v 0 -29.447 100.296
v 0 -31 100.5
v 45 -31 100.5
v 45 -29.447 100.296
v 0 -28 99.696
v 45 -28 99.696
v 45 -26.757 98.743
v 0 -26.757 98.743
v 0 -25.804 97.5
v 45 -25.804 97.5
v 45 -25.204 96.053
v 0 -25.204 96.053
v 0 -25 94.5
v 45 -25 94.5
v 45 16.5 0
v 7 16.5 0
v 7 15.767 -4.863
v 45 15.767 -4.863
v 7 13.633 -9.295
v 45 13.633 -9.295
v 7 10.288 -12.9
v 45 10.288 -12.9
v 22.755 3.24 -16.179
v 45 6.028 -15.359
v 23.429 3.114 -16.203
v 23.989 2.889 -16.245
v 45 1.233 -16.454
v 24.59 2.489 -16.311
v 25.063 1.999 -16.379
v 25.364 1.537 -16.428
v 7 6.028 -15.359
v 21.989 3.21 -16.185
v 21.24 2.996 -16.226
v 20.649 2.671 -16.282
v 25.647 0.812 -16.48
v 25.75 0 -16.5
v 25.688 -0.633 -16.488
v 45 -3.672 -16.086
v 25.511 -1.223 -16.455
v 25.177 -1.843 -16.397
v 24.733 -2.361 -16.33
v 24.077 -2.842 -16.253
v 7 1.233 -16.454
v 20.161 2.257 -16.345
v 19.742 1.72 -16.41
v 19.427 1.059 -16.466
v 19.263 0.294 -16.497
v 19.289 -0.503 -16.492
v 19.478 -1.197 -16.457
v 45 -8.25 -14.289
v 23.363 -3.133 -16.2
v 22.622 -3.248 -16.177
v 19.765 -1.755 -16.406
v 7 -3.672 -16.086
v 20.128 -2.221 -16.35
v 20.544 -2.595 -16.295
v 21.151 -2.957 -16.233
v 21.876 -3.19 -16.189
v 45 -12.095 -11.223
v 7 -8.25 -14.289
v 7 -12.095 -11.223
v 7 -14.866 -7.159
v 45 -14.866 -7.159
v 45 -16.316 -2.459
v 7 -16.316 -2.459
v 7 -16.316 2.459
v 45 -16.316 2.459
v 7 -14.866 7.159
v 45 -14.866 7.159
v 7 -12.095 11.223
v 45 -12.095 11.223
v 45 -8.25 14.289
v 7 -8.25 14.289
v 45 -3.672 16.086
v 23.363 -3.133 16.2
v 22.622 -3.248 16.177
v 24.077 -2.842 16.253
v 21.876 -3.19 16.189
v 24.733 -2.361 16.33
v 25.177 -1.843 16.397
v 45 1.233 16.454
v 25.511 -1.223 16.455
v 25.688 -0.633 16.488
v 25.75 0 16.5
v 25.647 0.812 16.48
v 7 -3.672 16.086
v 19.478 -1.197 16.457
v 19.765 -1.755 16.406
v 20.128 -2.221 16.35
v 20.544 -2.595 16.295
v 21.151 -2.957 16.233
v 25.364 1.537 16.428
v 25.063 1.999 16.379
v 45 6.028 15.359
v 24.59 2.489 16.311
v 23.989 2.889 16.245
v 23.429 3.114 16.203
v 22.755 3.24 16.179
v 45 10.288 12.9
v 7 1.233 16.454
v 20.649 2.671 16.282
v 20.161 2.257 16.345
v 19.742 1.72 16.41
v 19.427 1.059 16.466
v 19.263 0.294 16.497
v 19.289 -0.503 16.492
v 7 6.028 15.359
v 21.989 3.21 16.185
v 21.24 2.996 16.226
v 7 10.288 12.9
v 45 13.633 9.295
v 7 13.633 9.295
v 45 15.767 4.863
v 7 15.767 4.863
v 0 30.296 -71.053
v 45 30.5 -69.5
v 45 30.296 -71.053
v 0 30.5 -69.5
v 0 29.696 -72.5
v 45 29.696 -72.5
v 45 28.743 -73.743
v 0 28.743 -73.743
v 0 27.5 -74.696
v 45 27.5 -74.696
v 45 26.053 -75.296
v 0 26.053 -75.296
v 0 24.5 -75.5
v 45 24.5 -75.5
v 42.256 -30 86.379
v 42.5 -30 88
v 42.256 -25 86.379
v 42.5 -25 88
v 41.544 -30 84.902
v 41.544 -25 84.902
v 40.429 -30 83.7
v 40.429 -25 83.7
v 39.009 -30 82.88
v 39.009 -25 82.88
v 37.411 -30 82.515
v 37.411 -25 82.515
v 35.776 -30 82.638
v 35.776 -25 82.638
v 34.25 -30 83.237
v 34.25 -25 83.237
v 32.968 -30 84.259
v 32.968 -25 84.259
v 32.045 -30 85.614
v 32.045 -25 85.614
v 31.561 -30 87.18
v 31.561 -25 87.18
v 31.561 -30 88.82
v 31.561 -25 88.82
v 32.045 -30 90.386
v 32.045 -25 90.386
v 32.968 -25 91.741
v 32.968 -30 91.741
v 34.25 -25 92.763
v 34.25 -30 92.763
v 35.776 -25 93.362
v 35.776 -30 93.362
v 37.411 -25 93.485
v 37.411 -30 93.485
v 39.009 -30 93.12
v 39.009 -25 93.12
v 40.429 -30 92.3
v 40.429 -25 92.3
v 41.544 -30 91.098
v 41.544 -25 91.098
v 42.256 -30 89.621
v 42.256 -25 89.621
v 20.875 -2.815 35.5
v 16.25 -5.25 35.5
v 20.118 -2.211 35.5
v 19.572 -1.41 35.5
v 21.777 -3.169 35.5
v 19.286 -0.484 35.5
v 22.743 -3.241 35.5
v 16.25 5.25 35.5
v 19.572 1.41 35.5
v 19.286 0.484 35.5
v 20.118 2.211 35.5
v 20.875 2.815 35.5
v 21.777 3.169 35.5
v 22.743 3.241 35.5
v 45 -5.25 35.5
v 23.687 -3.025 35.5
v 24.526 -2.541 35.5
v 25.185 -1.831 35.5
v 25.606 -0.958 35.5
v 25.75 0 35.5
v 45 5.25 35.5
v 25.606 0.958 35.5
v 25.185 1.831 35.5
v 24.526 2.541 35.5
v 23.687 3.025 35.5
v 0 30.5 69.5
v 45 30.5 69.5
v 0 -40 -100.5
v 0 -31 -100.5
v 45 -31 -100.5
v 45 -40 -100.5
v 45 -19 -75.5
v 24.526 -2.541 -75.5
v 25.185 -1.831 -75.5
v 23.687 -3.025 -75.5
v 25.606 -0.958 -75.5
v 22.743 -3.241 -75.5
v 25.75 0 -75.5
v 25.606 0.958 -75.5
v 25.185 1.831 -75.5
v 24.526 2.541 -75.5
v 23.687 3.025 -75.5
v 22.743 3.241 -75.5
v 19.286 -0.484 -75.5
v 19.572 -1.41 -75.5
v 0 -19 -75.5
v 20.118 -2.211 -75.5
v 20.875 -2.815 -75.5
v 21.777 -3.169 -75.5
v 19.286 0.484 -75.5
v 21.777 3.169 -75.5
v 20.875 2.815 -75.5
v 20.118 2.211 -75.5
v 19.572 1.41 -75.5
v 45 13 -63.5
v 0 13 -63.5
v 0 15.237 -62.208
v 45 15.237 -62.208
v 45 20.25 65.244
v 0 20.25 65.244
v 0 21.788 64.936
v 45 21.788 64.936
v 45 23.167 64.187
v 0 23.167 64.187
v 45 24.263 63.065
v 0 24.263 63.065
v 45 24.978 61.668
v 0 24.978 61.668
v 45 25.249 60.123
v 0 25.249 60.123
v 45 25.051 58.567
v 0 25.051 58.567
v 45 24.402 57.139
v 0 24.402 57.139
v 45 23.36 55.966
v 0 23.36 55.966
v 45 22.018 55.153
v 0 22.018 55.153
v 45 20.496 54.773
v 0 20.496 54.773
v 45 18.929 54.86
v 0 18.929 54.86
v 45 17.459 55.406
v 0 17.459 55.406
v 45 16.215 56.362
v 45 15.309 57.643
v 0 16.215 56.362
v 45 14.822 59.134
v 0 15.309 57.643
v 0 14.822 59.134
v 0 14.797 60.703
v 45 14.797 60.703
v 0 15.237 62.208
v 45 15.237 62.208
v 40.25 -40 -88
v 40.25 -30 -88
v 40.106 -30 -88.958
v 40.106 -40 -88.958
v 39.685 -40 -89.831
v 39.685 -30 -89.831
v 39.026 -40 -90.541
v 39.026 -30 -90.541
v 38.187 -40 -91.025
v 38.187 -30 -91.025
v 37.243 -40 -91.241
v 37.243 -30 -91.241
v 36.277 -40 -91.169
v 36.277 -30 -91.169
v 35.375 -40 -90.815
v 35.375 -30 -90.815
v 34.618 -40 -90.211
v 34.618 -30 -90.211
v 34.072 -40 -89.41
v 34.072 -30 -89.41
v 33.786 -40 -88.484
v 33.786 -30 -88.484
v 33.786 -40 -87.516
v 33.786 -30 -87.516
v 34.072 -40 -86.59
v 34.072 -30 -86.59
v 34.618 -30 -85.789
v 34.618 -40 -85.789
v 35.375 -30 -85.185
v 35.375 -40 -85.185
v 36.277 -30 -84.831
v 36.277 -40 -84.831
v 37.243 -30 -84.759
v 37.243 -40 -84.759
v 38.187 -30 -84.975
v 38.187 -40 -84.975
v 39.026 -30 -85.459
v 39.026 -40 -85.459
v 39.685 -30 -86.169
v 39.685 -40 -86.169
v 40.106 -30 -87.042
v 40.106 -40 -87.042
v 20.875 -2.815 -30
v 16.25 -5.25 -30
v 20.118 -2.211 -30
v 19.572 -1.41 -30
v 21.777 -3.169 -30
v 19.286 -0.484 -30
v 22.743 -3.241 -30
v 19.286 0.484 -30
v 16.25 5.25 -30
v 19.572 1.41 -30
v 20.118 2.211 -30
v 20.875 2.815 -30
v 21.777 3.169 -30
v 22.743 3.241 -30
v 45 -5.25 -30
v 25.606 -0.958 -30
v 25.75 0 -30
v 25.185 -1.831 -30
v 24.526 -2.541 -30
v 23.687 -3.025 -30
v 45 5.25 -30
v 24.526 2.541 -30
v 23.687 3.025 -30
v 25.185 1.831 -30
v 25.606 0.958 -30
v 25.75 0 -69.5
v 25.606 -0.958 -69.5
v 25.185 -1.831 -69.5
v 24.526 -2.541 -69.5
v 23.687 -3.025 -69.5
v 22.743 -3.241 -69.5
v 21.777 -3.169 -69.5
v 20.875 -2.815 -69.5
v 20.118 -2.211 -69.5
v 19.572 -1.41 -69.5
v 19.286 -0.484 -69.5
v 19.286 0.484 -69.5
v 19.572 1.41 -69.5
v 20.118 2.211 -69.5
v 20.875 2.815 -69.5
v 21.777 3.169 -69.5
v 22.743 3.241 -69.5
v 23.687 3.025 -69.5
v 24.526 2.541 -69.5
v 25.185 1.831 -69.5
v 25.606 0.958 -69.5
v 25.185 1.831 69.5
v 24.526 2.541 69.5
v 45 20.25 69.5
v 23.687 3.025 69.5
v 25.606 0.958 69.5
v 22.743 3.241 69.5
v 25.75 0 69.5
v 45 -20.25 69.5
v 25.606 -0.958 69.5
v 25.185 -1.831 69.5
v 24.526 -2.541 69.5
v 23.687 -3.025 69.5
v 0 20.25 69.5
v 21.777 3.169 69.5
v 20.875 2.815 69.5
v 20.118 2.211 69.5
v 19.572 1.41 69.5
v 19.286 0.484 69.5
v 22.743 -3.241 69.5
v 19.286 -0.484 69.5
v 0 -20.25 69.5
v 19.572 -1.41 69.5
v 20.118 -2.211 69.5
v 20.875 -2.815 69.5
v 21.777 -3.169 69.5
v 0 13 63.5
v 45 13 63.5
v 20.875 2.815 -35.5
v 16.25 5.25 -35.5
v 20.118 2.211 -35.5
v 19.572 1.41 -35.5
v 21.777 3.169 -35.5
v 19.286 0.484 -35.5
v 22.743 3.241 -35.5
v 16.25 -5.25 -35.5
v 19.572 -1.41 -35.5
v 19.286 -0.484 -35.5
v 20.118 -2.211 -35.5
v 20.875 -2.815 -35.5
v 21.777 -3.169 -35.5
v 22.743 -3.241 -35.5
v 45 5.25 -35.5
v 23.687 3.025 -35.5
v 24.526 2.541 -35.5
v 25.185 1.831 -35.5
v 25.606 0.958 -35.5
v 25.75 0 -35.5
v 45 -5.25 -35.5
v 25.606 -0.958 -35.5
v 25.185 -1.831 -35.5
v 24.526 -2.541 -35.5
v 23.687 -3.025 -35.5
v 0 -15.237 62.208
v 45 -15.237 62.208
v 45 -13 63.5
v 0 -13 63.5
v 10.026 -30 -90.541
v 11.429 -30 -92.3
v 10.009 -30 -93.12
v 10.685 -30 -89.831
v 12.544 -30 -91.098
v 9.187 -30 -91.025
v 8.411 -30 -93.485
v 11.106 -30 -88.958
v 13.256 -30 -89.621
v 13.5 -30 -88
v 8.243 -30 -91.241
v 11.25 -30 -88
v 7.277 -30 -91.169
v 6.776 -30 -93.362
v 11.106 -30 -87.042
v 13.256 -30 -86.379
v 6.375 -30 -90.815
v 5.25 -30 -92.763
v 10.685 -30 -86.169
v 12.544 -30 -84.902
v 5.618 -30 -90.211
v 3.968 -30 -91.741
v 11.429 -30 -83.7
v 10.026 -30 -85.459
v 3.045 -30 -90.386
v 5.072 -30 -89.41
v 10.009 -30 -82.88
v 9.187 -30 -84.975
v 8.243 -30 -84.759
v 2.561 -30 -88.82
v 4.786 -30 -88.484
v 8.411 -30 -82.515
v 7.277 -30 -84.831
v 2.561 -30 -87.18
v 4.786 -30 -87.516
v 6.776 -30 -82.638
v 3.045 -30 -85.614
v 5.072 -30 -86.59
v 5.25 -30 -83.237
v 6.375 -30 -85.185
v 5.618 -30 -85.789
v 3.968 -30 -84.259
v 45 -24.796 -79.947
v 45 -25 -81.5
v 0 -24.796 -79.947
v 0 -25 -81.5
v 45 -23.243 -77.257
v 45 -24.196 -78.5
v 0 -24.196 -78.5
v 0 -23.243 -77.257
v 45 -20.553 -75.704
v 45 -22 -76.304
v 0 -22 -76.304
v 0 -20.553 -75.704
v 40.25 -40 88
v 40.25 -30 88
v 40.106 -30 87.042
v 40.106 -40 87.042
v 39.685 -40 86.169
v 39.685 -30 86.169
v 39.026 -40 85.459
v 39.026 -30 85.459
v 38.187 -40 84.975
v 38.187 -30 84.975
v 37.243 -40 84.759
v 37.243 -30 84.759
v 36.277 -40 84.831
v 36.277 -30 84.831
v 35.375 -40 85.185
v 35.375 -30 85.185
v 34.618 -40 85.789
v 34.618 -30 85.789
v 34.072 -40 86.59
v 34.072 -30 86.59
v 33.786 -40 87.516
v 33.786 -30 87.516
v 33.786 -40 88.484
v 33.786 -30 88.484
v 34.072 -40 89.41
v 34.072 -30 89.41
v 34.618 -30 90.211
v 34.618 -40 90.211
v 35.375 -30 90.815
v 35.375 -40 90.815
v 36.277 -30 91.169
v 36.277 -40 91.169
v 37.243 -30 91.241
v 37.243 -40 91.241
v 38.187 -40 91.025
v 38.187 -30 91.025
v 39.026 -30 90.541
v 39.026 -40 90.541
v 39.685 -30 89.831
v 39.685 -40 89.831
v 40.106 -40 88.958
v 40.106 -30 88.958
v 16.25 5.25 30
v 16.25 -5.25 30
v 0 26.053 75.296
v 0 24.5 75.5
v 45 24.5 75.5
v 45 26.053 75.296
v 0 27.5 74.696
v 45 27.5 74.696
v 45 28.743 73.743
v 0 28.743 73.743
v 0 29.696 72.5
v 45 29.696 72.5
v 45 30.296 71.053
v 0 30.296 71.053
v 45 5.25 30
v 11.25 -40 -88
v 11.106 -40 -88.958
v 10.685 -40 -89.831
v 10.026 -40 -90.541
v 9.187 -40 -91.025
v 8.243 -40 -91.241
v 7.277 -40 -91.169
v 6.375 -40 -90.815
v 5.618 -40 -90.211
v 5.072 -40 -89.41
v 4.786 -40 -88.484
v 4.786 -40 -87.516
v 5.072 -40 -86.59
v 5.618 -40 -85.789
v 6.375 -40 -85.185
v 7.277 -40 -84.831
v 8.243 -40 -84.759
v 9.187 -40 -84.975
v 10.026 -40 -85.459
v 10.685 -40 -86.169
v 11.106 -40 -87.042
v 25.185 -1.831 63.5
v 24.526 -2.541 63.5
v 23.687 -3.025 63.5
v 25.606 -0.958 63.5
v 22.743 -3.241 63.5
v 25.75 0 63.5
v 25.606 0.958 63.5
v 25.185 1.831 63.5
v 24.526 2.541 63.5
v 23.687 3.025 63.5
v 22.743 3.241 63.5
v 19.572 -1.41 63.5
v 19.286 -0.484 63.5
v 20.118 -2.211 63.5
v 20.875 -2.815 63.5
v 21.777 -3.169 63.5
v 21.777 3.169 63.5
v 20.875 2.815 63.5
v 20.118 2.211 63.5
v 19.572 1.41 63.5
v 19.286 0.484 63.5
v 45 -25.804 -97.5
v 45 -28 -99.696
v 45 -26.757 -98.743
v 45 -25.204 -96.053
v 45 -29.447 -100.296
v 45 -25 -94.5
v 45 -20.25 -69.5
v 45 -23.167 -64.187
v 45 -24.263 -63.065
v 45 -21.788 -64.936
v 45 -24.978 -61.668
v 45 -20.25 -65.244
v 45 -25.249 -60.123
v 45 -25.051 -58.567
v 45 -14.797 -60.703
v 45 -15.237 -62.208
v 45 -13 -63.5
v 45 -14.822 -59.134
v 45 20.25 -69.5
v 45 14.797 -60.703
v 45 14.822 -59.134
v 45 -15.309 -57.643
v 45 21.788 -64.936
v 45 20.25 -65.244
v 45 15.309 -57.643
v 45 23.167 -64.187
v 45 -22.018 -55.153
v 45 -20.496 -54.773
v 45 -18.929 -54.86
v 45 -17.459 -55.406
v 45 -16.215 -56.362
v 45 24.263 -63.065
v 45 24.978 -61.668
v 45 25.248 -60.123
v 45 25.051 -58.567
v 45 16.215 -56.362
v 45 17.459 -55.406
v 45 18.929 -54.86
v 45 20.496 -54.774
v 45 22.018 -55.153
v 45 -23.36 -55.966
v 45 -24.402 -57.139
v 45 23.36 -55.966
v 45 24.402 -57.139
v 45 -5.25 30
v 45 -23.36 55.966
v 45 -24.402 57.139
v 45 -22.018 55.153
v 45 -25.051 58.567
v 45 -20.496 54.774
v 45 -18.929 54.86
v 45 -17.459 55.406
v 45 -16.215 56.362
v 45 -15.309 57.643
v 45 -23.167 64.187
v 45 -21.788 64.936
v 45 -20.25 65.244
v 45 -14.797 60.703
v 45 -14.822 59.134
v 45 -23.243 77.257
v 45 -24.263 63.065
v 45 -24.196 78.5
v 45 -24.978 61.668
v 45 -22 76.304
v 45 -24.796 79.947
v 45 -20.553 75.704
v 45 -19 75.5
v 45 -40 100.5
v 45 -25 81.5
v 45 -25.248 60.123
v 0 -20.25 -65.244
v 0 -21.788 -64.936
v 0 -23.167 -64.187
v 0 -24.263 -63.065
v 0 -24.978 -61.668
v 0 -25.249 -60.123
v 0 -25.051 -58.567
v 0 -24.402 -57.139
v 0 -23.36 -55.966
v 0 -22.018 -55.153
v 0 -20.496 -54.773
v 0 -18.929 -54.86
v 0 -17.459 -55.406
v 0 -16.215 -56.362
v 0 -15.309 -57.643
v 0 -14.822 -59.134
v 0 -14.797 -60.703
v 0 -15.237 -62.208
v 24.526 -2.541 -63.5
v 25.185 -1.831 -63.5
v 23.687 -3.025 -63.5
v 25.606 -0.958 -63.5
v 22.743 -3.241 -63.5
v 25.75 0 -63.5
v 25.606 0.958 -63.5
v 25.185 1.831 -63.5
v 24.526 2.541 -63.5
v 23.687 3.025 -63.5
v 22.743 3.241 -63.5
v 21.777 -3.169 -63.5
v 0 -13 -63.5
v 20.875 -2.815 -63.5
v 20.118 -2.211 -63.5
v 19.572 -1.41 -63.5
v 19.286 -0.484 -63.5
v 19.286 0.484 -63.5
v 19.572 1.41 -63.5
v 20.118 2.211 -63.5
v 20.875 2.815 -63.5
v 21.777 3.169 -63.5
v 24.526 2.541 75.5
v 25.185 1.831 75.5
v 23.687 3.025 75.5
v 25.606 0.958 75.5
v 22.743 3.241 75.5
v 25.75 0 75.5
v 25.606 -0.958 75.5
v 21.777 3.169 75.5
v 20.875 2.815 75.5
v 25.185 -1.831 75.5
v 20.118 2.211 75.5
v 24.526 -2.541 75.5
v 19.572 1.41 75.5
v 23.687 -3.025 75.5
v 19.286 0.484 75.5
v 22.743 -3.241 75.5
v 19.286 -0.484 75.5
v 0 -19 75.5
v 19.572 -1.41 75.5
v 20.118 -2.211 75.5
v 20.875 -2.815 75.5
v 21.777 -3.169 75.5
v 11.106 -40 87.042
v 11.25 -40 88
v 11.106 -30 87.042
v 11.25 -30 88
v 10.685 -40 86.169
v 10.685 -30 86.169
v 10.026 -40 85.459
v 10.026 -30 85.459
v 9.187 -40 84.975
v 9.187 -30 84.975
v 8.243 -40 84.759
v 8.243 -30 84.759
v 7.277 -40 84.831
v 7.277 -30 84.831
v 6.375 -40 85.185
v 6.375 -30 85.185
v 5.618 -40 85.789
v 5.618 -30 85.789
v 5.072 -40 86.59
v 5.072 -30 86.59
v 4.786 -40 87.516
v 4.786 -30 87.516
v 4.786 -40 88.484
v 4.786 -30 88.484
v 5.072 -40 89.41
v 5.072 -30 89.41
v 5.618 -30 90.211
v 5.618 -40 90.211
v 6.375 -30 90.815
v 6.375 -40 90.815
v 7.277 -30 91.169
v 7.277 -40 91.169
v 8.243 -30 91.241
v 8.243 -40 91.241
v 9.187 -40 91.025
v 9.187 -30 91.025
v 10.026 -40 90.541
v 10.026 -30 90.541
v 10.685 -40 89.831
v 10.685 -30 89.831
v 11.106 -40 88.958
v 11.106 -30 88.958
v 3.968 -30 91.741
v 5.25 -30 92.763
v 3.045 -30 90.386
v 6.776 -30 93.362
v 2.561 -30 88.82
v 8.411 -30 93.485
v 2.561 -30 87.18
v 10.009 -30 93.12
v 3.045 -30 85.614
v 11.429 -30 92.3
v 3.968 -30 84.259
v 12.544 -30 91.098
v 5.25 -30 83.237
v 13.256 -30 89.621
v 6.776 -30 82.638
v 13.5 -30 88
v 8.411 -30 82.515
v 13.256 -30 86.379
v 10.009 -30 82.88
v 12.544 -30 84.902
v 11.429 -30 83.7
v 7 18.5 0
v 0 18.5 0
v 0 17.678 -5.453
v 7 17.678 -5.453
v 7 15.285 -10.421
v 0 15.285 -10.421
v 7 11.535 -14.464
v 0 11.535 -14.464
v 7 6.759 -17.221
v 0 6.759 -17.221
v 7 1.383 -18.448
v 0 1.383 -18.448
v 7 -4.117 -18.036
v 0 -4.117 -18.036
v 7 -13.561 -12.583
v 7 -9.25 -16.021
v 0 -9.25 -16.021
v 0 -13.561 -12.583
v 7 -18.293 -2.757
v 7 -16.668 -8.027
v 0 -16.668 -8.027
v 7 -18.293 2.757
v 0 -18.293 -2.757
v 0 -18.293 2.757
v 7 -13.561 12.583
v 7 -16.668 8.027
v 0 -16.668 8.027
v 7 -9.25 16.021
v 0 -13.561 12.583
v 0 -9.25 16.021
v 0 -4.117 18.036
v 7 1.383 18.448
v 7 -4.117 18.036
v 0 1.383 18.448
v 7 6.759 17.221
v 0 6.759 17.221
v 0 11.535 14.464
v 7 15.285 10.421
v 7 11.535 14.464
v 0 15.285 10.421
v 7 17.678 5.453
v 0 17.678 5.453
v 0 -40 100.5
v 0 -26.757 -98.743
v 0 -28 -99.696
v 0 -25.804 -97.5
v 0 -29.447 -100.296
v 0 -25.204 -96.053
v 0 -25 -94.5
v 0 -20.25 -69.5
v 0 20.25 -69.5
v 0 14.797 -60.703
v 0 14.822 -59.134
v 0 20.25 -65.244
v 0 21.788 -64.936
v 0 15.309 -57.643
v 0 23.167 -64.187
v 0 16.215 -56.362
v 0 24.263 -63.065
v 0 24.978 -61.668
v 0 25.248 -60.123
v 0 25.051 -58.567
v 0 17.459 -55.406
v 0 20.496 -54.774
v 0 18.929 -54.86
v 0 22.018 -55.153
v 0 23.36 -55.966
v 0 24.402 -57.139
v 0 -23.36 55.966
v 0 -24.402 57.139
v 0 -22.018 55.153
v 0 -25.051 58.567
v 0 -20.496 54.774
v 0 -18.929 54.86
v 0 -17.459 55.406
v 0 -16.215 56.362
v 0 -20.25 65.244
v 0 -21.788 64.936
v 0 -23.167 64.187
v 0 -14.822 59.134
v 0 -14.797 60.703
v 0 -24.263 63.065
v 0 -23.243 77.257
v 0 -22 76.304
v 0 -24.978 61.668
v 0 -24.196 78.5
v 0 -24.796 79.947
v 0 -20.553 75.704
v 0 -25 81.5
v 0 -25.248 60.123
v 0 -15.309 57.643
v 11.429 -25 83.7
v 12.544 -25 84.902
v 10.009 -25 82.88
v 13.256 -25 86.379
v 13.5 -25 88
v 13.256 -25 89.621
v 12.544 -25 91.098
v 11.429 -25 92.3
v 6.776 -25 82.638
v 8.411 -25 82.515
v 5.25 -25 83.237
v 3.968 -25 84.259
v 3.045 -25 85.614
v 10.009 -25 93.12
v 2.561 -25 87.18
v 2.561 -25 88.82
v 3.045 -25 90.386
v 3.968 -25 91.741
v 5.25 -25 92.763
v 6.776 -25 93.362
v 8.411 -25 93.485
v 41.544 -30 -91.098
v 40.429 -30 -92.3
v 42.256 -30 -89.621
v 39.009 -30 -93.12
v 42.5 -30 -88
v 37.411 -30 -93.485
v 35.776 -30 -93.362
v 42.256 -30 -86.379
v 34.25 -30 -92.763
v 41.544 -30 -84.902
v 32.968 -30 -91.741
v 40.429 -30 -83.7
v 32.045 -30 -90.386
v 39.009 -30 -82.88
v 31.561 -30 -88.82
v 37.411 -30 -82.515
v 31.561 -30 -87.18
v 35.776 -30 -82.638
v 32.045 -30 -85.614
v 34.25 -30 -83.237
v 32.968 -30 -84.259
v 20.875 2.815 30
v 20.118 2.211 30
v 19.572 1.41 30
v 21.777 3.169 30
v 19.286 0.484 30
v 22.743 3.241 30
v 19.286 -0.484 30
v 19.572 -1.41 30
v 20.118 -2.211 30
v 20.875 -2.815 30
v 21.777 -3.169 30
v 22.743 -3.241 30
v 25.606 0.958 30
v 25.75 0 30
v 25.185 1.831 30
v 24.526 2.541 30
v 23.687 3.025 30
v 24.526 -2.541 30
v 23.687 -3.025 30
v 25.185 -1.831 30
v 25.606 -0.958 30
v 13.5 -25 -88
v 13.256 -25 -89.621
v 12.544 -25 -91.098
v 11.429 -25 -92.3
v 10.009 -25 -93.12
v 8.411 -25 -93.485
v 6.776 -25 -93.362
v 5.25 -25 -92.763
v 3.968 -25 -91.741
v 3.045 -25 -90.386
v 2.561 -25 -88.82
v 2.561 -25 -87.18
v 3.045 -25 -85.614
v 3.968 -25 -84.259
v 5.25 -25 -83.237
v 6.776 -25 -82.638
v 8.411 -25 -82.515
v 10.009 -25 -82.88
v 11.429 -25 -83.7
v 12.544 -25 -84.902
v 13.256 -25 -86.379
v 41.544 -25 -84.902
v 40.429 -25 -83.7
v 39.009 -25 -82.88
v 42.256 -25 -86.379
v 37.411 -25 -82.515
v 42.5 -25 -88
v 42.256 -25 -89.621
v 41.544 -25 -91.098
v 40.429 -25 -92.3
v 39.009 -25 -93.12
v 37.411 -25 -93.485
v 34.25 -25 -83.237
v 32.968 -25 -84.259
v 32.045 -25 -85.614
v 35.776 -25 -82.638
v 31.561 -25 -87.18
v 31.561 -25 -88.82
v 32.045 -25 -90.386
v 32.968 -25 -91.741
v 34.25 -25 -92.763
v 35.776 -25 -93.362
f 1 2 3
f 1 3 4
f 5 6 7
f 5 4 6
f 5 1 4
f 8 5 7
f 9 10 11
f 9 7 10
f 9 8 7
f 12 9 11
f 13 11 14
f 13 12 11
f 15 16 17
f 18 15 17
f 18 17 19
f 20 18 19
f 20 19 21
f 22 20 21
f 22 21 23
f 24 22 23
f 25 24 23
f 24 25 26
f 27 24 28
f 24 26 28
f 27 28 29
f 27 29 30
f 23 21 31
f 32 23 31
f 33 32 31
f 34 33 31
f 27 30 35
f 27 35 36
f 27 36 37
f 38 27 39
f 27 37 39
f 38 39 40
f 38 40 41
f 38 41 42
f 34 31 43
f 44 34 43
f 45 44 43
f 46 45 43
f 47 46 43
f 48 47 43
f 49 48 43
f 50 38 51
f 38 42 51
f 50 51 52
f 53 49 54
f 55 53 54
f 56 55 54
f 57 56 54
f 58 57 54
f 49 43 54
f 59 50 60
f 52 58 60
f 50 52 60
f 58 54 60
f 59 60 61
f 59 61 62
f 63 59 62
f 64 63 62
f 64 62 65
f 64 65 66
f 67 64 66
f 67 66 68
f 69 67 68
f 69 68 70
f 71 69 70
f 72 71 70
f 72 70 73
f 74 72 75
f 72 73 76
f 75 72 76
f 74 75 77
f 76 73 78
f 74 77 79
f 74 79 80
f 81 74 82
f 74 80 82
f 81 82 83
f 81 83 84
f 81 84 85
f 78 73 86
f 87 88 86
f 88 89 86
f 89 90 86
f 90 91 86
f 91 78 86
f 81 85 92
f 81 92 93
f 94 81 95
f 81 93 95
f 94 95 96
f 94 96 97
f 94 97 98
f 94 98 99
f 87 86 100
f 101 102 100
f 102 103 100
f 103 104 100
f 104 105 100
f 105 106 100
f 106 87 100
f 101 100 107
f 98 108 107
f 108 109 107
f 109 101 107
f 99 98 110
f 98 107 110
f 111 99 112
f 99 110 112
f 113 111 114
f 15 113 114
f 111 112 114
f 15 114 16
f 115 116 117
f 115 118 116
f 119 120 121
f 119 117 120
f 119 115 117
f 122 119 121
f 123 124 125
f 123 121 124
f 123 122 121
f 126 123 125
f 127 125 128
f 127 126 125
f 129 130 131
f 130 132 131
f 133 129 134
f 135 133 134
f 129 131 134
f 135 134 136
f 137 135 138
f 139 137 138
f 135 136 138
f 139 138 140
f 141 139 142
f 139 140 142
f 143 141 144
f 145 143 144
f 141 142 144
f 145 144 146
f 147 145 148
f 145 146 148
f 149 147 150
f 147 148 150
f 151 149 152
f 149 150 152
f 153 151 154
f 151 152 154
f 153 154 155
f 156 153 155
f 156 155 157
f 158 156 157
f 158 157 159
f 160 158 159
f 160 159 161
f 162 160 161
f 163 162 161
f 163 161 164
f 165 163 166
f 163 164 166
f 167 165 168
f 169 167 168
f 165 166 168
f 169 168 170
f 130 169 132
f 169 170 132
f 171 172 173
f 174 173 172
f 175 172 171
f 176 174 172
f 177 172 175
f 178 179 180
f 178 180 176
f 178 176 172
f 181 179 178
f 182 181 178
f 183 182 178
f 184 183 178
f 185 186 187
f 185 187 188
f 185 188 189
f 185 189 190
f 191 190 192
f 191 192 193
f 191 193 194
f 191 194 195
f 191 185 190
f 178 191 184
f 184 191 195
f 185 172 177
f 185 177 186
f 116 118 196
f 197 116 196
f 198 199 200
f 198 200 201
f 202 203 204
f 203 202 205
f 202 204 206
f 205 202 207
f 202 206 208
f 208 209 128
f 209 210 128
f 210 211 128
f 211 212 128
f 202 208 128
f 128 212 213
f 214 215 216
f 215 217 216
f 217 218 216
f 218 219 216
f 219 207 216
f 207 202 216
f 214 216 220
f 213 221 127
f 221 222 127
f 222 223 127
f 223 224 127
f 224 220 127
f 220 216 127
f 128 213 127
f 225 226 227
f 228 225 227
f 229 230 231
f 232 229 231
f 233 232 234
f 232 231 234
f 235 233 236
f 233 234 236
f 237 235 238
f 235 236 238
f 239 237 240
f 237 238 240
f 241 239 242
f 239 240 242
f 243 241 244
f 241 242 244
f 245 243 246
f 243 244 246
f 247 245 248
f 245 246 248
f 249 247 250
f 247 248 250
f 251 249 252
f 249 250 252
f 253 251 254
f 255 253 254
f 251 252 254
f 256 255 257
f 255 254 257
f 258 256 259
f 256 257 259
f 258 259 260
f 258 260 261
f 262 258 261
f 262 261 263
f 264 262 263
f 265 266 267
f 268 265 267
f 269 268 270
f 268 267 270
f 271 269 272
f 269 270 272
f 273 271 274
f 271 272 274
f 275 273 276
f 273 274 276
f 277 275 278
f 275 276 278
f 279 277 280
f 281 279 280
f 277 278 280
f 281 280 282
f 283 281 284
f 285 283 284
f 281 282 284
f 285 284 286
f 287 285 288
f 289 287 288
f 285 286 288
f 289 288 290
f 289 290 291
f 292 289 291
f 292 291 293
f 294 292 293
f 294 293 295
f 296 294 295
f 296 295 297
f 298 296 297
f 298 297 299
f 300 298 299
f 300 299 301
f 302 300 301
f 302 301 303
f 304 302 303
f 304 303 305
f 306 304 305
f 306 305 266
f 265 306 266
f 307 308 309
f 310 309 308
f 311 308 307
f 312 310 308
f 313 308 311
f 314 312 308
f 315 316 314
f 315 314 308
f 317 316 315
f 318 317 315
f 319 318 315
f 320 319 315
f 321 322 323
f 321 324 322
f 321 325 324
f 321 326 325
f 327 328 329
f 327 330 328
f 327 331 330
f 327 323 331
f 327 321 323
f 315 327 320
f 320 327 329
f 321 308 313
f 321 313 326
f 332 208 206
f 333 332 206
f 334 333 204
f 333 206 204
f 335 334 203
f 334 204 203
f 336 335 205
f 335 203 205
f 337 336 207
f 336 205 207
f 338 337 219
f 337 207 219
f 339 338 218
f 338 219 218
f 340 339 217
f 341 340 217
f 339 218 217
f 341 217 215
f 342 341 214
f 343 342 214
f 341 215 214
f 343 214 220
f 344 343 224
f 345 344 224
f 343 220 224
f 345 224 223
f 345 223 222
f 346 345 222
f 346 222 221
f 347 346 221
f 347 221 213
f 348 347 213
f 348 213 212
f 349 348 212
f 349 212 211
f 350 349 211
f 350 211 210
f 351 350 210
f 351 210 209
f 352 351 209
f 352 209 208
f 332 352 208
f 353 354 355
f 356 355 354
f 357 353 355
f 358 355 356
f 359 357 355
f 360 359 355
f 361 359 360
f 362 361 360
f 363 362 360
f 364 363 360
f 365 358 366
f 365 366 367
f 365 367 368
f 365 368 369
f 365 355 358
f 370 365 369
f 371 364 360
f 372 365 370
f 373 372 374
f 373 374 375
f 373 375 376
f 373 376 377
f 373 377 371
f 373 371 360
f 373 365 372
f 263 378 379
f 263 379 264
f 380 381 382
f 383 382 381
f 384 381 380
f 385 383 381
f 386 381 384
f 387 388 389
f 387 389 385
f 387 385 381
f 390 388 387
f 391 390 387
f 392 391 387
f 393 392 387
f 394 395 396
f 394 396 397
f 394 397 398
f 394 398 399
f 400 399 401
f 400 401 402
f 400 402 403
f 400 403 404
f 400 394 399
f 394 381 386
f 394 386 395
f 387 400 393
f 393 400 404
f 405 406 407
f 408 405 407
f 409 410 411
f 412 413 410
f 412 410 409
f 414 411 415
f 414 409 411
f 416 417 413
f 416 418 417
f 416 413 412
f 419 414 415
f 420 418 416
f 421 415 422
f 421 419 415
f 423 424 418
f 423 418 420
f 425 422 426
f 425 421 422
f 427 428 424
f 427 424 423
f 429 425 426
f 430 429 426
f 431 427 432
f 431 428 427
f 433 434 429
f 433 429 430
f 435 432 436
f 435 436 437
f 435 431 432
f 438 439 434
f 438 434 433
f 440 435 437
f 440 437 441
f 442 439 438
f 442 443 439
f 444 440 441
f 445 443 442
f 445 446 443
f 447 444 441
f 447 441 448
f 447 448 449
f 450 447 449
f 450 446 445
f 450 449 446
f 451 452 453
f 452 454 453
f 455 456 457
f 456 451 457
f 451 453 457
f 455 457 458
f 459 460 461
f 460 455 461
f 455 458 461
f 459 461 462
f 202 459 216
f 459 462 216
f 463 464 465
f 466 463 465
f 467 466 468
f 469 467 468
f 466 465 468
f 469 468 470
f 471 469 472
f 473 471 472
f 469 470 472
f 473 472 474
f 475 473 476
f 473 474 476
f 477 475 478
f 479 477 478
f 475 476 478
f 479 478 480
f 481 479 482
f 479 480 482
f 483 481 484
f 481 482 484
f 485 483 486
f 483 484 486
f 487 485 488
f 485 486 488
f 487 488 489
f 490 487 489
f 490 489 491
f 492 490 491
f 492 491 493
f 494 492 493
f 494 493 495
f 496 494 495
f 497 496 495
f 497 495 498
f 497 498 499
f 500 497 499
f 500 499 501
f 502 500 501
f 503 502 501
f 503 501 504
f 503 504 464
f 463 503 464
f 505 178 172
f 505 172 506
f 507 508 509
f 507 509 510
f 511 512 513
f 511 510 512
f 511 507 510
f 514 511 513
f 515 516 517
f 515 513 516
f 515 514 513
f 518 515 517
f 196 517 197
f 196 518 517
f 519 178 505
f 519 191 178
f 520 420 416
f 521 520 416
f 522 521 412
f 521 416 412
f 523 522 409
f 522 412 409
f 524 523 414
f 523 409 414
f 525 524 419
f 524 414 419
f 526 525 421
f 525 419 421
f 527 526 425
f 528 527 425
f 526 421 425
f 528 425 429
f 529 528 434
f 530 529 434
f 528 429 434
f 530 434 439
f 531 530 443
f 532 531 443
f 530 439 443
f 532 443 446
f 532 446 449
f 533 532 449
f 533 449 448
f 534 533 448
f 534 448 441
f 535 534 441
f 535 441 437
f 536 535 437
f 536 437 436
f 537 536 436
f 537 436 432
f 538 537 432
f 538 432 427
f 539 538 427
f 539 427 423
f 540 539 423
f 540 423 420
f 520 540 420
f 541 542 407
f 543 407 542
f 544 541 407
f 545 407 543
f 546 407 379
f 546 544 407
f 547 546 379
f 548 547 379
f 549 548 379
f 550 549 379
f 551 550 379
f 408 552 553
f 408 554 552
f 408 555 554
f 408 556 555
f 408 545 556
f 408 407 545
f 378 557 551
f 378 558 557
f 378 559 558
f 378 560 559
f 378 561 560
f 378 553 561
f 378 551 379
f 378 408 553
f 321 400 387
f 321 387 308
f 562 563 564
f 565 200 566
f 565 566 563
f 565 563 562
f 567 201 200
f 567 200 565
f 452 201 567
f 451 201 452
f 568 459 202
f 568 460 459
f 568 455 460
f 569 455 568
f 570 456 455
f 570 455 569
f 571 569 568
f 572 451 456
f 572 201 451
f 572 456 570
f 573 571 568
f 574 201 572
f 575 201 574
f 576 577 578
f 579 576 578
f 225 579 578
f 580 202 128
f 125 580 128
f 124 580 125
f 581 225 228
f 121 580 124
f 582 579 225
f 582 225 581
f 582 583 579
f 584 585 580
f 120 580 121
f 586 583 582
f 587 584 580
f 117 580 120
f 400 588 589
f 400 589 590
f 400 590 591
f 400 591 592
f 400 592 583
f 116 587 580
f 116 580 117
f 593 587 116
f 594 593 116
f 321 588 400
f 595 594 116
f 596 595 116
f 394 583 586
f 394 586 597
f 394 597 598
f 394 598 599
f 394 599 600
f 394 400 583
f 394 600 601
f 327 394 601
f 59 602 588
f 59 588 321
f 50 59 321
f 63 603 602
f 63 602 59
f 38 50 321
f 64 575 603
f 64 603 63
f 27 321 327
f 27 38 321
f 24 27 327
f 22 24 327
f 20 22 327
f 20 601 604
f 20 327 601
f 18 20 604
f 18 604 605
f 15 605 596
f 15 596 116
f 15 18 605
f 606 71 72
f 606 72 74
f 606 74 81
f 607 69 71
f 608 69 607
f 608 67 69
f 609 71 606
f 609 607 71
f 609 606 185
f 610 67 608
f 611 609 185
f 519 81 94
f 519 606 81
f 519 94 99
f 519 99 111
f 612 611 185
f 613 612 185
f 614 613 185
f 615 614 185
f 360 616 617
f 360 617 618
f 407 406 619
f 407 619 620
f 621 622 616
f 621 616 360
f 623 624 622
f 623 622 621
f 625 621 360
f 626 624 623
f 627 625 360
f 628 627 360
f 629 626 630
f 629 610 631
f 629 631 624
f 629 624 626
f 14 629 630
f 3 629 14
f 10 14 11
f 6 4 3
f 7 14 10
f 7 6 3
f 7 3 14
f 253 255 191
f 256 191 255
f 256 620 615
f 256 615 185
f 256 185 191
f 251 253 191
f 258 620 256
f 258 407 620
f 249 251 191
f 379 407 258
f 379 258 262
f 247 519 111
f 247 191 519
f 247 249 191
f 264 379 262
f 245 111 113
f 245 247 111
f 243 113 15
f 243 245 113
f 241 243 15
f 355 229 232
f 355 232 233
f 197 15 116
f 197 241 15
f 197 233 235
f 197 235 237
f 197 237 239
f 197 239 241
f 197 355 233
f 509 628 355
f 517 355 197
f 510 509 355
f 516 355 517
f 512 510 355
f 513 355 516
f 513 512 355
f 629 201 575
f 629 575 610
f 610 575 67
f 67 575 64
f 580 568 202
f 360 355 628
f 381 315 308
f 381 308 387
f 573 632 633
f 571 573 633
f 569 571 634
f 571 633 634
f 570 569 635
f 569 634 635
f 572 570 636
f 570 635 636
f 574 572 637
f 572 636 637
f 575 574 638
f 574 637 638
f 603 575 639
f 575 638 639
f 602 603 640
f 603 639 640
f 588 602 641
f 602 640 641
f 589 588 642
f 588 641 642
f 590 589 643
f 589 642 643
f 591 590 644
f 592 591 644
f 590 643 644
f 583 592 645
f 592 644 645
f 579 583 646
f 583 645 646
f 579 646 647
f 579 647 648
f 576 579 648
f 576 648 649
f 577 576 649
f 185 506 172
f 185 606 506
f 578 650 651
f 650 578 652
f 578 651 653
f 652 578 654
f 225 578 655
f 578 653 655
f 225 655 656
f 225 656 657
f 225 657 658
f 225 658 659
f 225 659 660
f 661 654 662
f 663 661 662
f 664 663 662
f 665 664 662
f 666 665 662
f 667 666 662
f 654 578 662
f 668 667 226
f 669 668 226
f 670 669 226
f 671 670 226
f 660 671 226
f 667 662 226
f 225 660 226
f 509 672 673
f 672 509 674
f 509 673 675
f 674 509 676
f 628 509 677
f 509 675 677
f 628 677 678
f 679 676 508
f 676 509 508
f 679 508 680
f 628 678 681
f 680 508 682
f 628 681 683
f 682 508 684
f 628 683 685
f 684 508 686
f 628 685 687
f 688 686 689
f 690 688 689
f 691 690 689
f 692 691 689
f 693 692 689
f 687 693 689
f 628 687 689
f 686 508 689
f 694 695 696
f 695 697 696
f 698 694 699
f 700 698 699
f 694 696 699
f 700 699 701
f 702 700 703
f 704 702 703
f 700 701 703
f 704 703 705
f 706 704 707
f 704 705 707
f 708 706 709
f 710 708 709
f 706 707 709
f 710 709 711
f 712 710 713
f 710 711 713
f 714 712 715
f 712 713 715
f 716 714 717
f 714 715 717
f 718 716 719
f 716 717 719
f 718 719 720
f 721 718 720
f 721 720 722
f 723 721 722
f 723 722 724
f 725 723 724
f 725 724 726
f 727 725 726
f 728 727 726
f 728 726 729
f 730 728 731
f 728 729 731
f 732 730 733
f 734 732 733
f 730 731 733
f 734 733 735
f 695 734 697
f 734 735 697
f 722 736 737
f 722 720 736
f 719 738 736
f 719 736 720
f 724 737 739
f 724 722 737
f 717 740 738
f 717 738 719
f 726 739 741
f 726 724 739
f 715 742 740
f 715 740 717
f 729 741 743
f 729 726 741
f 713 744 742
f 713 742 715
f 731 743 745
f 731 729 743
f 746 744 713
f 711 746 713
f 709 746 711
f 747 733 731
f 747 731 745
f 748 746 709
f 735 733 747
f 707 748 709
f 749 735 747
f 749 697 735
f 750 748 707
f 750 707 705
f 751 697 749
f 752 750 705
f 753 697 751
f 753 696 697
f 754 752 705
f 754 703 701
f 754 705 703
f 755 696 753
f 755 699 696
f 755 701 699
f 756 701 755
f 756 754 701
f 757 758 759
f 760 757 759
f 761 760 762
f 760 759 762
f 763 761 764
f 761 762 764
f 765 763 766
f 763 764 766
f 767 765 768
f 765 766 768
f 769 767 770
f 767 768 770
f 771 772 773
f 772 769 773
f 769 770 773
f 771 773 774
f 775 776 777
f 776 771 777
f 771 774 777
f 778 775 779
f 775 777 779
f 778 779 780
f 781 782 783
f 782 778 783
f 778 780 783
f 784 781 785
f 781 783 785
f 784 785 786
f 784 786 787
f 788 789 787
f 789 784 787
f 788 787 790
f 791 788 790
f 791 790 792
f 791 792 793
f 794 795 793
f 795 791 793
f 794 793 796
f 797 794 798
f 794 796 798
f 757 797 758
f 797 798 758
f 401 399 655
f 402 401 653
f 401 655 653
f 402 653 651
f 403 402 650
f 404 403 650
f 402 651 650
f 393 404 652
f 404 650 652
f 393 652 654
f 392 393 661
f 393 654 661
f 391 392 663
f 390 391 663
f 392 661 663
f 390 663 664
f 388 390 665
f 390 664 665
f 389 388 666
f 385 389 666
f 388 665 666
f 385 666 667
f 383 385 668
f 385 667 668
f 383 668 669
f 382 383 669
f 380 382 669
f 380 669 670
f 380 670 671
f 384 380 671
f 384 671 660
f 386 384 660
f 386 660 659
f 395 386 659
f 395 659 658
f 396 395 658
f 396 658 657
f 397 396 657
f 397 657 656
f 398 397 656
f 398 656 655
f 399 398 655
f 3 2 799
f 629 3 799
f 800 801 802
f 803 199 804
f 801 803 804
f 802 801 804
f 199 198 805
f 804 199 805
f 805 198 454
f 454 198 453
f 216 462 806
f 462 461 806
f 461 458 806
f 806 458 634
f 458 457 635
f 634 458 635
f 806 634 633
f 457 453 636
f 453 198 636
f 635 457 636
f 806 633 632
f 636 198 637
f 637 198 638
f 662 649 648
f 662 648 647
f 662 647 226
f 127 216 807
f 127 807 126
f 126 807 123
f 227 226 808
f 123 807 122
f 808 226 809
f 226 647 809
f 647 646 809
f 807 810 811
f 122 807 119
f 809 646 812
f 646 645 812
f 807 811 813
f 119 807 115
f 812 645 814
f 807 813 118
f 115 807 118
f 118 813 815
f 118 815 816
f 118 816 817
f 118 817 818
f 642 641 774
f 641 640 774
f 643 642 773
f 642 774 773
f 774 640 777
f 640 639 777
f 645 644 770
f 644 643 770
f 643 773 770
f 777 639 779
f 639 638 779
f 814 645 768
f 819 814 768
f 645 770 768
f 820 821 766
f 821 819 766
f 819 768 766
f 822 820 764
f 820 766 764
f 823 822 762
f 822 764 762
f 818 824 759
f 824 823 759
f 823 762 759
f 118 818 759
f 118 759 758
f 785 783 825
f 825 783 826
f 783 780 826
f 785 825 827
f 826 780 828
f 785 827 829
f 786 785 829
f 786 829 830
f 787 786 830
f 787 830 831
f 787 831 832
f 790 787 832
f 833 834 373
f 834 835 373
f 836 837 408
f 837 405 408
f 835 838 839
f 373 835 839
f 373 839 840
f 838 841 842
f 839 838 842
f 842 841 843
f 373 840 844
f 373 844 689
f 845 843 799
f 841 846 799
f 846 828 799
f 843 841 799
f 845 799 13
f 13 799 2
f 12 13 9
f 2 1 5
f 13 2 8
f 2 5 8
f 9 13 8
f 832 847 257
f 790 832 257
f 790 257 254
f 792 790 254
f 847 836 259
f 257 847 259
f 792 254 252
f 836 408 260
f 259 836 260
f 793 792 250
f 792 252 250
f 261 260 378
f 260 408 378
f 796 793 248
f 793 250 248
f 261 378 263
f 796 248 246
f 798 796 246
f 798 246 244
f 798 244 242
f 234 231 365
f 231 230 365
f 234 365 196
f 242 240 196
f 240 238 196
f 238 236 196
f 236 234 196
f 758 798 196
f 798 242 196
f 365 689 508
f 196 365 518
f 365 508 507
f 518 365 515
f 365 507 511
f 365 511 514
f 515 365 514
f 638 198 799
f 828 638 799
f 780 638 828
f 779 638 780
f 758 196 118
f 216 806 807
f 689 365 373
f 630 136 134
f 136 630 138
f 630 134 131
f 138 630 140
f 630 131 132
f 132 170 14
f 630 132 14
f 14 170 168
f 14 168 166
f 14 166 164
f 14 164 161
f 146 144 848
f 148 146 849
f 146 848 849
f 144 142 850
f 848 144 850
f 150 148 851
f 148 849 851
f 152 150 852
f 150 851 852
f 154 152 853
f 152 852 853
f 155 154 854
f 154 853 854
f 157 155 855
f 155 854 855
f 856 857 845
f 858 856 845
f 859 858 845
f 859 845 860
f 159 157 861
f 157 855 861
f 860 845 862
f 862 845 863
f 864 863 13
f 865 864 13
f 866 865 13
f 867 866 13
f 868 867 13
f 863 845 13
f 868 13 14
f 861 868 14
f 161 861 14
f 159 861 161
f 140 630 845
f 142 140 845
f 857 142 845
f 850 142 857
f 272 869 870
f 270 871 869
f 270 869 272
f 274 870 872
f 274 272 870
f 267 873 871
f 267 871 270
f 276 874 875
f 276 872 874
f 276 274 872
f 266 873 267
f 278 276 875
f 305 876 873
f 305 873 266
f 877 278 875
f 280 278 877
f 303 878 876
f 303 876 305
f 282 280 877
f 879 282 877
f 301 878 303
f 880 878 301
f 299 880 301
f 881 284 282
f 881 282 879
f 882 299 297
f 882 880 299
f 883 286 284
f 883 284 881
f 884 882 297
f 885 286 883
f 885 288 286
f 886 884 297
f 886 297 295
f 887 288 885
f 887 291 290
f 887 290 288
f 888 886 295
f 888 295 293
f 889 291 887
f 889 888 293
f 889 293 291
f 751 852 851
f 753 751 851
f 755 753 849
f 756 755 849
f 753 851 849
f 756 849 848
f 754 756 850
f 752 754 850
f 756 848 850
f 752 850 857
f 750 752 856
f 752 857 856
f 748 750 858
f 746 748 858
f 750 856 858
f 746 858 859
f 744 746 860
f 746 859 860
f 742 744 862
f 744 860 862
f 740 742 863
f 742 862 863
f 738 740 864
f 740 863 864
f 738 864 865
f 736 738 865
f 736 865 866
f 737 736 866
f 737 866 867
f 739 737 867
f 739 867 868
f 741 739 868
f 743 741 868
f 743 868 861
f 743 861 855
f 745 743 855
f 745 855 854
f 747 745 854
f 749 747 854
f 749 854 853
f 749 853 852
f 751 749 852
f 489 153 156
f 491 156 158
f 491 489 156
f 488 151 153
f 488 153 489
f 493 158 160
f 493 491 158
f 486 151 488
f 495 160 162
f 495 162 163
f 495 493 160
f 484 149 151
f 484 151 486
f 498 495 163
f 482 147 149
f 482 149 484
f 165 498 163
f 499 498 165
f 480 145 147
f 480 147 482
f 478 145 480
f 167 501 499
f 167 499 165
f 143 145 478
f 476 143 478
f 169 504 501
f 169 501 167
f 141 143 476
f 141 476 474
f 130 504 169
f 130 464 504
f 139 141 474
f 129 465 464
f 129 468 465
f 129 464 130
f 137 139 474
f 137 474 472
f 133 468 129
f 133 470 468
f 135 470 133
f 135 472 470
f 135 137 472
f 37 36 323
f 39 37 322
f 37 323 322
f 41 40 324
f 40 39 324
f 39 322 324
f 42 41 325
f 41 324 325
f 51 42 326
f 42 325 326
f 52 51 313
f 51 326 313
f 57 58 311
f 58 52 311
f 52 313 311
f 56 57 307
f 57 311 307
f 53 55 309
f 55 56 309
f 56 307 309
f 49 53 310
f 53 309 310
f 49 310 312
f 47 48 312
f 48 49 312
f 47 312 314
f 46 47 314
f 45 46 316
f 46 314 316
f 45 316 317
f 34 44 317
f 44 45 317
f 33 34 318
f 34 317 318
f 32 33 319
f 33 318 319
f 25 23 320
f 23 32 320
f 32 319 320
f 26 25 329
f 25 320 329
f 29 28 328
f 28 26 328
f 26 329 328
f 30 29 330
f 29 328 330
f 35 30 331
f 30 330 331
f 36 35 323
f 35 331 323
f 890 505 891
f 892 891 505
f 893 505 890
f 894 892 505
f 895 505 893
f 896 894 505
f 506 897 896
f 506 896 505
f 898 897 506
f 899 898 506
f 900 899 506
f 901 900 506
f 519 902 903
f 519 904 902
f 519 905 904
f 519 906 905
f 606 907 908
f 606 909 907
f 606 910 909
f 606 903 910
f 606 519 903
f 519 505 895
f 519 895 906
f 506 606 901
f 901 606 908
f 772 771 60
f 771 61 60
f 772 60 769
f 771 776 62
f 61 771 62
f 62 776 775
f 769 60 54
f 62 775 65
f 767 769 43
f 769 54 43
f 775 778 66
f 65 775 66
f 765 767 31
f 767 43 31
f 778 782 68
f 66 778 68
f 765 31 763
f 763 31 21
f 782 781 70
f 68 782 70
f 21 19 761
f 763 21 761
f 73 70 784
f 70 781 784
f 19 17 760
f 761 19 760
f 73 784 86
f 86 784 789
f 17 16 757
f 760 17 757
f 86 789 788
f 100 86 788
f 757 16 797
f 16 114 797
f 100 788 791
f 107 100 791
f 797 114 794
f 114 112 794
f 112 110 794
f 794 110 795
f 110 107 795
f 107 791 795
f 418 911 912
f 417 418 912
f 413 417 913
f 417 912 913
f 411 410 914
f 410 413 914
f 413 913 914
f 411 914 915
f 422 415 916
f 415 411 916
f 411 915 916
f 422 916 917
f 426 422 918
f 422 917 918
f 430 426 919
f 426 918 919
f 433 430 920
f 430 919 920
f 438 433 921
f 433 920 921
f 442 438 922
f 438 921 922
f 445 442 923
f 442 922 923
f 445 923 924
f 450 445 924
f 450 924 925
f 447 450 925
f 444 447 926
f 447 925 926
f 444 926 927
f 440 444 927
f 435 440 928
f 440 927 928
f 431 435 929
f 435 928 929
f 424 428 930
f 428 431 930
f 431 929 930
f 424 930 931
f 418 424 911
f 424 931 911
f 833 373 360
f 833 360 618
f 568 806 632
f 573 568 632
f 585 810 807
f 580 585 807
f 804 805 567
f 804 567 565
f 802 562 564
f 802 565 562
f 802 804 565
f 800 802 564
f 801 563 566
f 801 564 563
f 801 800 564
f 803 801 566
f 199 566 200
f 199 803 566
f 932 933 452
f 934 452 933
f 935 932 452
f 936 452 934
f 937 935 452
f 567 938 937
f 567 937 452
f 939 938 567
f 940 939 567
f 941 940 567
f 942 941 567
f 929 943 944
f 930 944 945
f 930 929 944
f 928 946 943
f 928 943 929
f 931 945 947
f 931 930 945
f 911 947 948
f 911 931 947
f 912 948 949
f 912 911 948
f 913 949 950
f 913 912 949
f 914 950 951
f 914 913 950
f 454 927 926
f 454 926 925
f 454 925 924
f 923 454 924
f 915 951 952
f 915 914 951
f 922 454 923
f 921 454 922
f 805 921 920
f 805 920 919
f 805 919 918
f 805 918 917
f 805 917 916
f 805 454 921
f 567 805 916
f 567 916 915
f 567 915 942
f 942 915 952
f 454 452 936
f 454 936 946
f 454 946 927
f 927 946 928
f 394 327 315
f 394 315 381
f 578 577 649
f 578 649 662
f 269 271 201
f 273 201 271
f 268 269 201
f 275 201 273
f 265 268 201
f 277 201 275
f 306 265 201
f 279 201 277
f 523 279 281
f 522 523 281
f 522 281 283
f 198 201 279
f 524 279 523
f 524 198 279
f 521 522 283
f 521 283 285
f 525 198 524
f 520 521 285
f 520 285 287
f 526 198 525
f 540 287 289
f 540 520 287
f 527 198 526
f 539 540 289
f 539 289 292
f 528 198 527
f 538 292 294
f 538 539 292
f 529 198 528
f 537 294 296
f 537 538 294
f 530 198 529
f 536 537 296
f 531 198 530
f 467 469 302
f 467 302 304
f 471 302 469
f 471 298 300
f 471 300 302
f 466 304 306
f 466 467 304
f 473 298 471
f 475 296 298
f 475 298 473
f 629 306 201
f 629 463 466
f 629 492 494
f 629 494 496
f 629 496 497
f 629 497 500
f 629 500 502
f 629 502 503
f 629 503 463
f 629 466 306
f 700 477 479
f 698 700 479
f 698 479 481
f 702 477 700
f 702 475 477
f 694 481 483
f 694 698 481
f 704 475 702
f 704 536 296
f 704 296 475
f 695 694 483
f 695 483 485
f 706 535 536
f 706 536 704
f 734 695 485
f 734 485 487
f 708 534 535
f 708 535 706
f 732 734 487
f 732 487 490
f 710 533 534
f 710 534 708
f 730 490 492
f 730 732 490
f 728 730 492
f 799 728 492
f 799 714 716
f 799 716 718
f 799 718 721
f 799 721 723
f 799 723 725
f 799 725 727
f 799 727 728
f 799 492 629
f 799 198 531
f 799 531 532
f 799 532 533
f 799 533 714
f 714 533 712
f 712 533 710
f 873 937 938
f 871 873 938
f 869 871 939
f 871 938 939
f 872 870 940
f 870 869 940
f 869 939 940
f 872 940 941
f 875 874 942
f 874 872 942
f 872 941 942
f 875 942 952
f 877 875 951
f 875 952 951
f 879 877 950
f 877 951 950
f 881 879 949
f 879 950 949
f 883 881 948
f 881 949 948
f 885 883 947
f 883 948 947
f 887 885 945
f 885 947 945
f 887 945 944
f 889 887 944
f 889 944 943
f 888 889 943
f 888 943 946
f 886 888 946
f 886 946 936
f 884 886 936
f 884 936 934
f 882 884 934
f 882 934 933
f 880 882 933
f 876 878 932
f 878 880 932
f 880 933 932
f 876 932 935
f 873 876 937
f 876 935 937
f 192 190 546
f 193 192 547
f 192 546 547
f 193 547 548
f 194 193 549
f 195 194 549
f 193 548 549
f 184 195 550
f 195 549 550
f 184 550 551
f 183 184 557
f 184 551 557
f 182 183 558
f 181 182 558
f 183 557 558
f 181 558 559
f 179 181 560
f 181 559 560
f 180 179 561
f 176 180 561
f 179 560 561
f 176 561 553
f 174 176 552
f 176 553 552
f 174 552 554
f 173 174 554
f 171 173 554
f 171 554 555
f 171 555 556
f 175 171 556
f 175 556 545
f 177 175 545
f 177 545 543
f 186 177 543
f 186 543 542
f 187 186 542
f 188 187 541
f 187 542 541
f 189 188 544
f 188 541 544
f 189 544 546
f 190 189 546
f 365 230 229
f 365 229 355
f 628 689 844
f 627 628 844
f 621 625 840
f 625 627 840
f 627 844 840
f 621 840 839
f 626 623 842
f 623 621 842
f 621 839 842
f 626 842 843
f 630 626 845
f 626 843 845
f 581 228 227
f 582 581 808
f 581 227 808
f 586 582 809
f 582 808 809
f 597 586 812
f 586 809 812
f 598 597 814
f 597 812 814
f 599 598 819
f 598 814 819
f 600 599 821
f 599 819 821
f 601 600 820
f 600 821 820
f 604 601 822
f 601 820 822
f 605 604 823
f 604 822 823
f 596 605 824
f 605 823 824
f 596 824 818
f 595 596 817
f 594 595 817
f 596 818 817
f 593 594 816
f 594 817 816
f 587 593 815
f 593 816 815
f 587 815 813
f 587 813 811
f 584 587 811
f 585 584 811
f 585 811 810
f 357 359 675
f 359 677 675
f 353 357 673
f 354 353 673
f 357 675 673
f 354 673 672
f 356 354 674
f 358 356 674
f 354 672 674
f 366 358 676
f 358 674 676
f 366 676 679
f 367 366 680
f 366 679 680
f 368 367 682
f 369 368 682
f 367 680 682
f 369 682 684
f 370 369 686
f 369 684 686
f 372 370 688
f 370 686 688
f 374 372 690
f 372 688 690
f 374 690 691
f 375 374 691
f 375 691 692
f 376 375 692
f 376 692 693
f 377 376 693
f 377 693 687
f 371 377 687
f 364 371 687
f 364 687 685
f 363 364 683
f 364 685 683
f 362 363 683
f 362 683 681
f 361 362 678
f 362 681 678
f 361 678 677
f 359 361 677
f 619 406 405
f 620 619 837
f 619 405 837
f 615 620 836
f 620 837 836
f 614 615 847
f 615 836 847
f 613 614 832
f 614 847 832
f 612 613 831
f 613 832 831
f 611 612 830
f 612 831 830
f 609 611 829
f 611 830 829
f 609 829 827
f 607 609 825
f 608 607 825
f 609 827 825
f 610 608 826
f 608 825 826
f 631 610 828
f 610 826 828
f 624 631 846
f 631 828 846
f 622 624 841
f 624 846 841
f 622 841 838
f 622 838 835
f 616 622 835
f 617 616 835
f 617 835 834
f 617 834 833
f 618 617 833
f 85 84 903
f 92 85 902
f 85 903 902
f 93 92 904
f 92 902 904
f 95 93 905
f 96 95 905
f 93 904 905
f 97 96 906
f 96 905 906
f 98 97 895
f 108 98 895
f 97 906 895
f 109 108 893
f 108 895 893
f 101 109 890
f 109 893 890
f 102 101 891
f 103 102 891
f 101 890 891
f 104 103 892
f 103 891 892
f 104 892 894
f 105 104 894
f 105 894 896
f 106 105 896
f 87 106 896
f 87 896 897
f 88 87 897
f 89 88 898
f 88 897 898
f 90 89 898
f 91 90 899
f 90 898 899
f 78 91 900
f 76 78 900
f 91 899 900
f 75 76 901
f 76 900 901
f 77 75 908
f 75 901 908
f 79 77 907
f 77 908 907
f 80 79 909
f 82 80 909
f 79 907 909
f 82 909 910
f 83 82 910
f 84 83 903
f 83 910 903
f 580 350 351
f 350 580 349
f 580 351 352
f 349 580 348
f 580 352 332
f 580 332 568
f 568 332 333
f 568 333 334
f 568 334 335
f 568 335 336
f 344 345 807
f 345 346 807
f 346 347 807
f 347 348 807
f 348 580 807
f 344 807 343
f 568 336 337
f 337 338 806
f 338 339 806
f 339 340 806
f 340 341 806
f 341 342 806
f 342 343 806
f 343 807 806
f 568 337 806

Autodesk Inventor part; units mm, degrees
ref_plane "YZ Plane" through (0, 0, 0) normal (1, 0, 0) x (0, 1, 0)
ref_plane "XZ Plane" through (0, 0, 0) normal (0, 1, 0) x (-1, 0, 0)
ref_plane "XY Plane" through (0, 0, 0) normal (0, 0, 1) x (1, 0, 0)
sketch "Szkic1" plane through (0, 0, 0) normal (1, 0, 0) x (0, 1, 0)
  circle A0 centre (0, 0) radius 16.5
  arc A1 (16.0869, 63.5) -> (15.2371, 62.2084) centre (20, 60) ccw construction
  arc A2 (-20.25, 65.244) -> (-15.2371, 62.2084) centre (-20, 60) ccw
  line L0 (20.25, 69.5) -> (-20.25, 69.5)
  line L1 (-20.25, 69.5) -> (-20.25, 65.244)
  line L2 (-20.25, 63.5) -> (-16.0869, 63.5) construction
  line L3 (20.25, 63.5) -> (20.25, 65.244) construction
  line L4 (16.0869, 63.5) -> (20.25, 63.5) construction
  line L5 (20.25, 65.244) -> (20.25, 69.5)
  line L6 (-20.25, 65.244) -> (-20.25, 63.5) construction
  line L7 (-16.0869, 63.5) -> (-13, 63.5) construction
  arc A3 (20.25, 65.244) -> (16.0869, 63.5) centre (20, 60) ccw construction
  arc A4 (-16.0869, 63.5) -> (-20.25, 65.244) centre (-20, 60) ccw construction
  line L8 (-15.2371, 62.2084) -> (-13, 63.5)
  line L9 (13, 63.5) -> (15.2371, 62.2084)
  arc A5 (15.2371, 62.2084) -> (20.25, 65.244) centre (20, 60) ccw
  line L10 (13, 63.5) -> (16.0869, 63.5) construction
  arc A6 (-15.2371, 62.2084) -> (-16.0869, 63.5) centre (-20, 60) ccw construction
  line L11 (-13, 63.5) -> (13, 63.5)
  line L12 (16.5, 0) -> (-16.5, 0) construction
  arc A7 (15.2371, -62.2084) -> (16.0869, -63.5) centre (20, -60) ccw construction
  arc A8 (-15.2371, -62.2084) -> (-20.25, -65.244) centre (-20, -60) ccw
  line L13 (20.25, -69.5) -> (-20.25, -69.5)
  line L14 (-20.25, -69.5) -> (-20.25, -65.244)
  line L15 (-20.25, -63.5) -> (-16.0869, -63.5) construction
  line L16 (20.25, -63.5) -> (20.25, -65.244) construction
  line L17 (16.0869, -63.5) -> (20.25, -63.5) construction
  line L18 (20.25, -65.244) -> (20.25, -69.5)
  line L19 (-20.25, -65.244) -> (-20.25, -63.5) construction
  line L20 (-16.0869, -63.5) -> (-13, -63.5) construction
  arc A9 (16.0869, -63.5) -> (20.25, -65.244) centre (20, -60) ccw construction
  arc A10 (-20.25, -65.244) -> (-16.0869, -63.5) centre (-20, -60) ccw construction
  line L21 (-15.2371, -62.2084) -> (-13, -63.5)
  line L22 (13, -63.5) -> (15.2371, -62.2084)
  arc A11 (20.25, -65.244) -> (15.2371, -62.2084) centre (20, -60) ccw
  line L23 (13, -63.5) -> (16.0869, -63.5) construction
  arc A12 (-16.0869, -63.5) -> (-15.2371, -62.2084) centre (-20, -60) ccw construction
  line L24 (-13, -63.5) -> (13, -63.5)
  line L25 (24.5, 75.5) -> (-19, 75.5)
  line L26 (-40, 75.5) -> (-40, -75.5)
  line L27 (-19, -75.5) -> (24.5, -75.5)
  line L28 (30.5, -69.5) -> (30.5, -31.5)
  arc A13 (30.5, 69.5) -> (24.5, 75.5) centre (24.5, 69.5) ccw
  arc A14 (24.5, -75.5) -> (30.5, -69.5) centre (24.5, -69.5) ccw
  line L29 (-40, 75.5) -> (-25, 75.5) construction
  line L30 (-25, 81.5) -> (-25, 94.5)
  line L31 (-31, 100.5) -> (-40, 100.5)
  line L32 (-40, 100.5) -> (-40, 75.5)
  arc A15 (-25, 94.5) -> (-31, 100.5) centre (-31, 94.5) ccw
  arc A16 (-25, 81.5) -> (-19, 75.5) centre (-19, 81.5) ccw
  line L33 (-40, -75.5) -> (-25, -75.5) construction
  line L34 (-25, -81.5) -> (-25, -94.5)
  line L35 (-31, -100.5) -> (-40, -100.5)
  line L36 (-40, -100.5) -> (-40, -75.5)
  arc A17 (-31, -100.5) -> (-25, -94.5) centre (-31, -94.5) ccw
  arc A18 (-19, -75.5) -> (-25, -81.5) centre (-19, -81.5) ccw
  line L37 (30.5, 25.5) -> (30.5, -25.5) construction
  line L38 (30.5, 31.5) -> (30.5, 69.5)
  line L39 (30.5, -31.5) -> (30.5, 31.5)
  circle A19 centre (0, 0) radius 18.5
  point P0 (-25, 100.5)
  point P1 (-25, -100.5)
  dimension "d0" = 33
  dimension "d1" = 10.5
  dimension "d3" = 20
  dimension "d4" = 60
  dimension "d6" = 6
  dimension "d8" = 3.5
  dimension "d9" = 150
  dimension "d10" = 150
  dimension "d11" = 26
  dimension "d12" = 13
  dimension "d13" = 6
  dimension "d14" = 6
  dimension "d15" = 10.5
  dimension "d16" = 20
  dimension "d17" = 6
  dimension "d18" = 15
  dimension "d19" = 25
  dimension "d20" = 6
  dimension "d21" = 15
  dimension "d22" = 25
  dimension "d23" = 6
  dimension "d50" = 37
  dimension "d55" = 40
  dimension "d56" = 0.25
  dimension "d57" = 0.25
extrude "Wyciągnięcie proste1" add sketch "Szkic1" along normal blind 45 contours A0 | L1 L0 L5 A5 L9 L11 L8 A2 | L21 L24 L22 A11 L18 L13 L14 A8 | A13 L38 L39 L28 A14 L27 A18 L34 A17 L35 L36 L26 L32 L31 A15 L30 A16 L25 | A19
extrude "Wyciągnięcie proste4" cut sketch "Szkic1" along normal through all contours A0 | L1 L0 L5 A5 L9 L11 L8 A2 | L21 L24 L22 A11 L18 L13 L14 A8
extrude "Wyciągnięcie proste7" cut sketch "Szkic1" along normal blind 7 contours A19
sketch "Szkic2" plane through (0, -25, 94.5) normal (0, 1, 0) x (1, 0, 0)
  circle A0 centre (37, 6.5) radius 5.5
  circle A1 centre (8, 6.5) radius 5.5
  circle A2 centre (37, 6.5) radius 3.25
  circle A3 centre (8, 6.5) radius 3.25
  line L0 (45, 13) -> (45, 0) projected
  line L1 (0, -6) -> (45, -6) projected
  line L2 (0, 13) -> (0, 0) projected
  point P0 (0, 94.5)
  dimension "d41" = 6.5
  dimension "d42" = 11
  dimension "d43" = 8
  dimension "d44" = 12.5
  dimension "d45" = 8
extrude "Wyciągnięcie proste5" cut sketch "Szkic2" against normal through all contours A2 | A3
extrude "Wyciągnięcie proste6" cut sketch "Szkic2" against normal blind 5
sketch "Szkic3" plane through (0, -19, 75.5) normal (0, 0, 1) x (1, 0, 0)
  line L0 (45, 32) -> (45, 6) projected
  line L1 (0, 32) -> (45, 32) projected
  line L2 (0, 6) -> (0, 32) projected
  line L3 (0, 6) -> (45, 6) projected
  line L4 (0, 6) -> (45, 6) projected
  line L5 (0, 32) -> (45, 6) construction
  line L6 (45, 32) -> (0, 6) construction
  circle A0 centre (22.5, 19) radius 3.25
  circle A1 centre (22.5, 19) radius 5.5
  point P0 (0, 19)
  dimension "d58" = 6.5
  dimension "d59" = 11
extrude "Wyciągnięcie proste9" cut sketch "Szkic3" against normal blind 60 contours A0
sketch "Szkic4" plane through (45, 0, 0) normal (1, 0, 0) x (0, 0, -1)
  line L0 (-35.5, 5.25) -> (-30, 5.25)
  line L1 (-30, 5.25) -> (-30, -5.25)
  line L2 (-30, -5.25) -> (-35.5, -5.25)
  line L3 (-35.5, -5.25) -> (-35.5, 5.25)
  line L4 (-75.5, 24.5) -> (-75.5, -19) projected
  point P0 (0, 0)
  dimension "d62" = 10.5
  dimension "d63" = 5.25
  dimension "d64" = 40
  dimension "d65" = 5.5
extrude "Wyciągnięcie proste10" cut sketch "Szkic4" against normal blind 28.75
mirror "Odbij3" about plane through (0, 0, 0) normal (0, 0, 1) of "Wyciągnięcie proste10", "Wyciągnięcie proste9", "Wyciągnięcie proste6", "Wyciągnięcie proste5"
equation "\"d3\" = 0.5 * d2"
equation "\"d12\" = 0.5 * d11"
equation "\"d14\" = d13"
equation "\"d2\" = 40"
properties part number "Y_motor_mount"
